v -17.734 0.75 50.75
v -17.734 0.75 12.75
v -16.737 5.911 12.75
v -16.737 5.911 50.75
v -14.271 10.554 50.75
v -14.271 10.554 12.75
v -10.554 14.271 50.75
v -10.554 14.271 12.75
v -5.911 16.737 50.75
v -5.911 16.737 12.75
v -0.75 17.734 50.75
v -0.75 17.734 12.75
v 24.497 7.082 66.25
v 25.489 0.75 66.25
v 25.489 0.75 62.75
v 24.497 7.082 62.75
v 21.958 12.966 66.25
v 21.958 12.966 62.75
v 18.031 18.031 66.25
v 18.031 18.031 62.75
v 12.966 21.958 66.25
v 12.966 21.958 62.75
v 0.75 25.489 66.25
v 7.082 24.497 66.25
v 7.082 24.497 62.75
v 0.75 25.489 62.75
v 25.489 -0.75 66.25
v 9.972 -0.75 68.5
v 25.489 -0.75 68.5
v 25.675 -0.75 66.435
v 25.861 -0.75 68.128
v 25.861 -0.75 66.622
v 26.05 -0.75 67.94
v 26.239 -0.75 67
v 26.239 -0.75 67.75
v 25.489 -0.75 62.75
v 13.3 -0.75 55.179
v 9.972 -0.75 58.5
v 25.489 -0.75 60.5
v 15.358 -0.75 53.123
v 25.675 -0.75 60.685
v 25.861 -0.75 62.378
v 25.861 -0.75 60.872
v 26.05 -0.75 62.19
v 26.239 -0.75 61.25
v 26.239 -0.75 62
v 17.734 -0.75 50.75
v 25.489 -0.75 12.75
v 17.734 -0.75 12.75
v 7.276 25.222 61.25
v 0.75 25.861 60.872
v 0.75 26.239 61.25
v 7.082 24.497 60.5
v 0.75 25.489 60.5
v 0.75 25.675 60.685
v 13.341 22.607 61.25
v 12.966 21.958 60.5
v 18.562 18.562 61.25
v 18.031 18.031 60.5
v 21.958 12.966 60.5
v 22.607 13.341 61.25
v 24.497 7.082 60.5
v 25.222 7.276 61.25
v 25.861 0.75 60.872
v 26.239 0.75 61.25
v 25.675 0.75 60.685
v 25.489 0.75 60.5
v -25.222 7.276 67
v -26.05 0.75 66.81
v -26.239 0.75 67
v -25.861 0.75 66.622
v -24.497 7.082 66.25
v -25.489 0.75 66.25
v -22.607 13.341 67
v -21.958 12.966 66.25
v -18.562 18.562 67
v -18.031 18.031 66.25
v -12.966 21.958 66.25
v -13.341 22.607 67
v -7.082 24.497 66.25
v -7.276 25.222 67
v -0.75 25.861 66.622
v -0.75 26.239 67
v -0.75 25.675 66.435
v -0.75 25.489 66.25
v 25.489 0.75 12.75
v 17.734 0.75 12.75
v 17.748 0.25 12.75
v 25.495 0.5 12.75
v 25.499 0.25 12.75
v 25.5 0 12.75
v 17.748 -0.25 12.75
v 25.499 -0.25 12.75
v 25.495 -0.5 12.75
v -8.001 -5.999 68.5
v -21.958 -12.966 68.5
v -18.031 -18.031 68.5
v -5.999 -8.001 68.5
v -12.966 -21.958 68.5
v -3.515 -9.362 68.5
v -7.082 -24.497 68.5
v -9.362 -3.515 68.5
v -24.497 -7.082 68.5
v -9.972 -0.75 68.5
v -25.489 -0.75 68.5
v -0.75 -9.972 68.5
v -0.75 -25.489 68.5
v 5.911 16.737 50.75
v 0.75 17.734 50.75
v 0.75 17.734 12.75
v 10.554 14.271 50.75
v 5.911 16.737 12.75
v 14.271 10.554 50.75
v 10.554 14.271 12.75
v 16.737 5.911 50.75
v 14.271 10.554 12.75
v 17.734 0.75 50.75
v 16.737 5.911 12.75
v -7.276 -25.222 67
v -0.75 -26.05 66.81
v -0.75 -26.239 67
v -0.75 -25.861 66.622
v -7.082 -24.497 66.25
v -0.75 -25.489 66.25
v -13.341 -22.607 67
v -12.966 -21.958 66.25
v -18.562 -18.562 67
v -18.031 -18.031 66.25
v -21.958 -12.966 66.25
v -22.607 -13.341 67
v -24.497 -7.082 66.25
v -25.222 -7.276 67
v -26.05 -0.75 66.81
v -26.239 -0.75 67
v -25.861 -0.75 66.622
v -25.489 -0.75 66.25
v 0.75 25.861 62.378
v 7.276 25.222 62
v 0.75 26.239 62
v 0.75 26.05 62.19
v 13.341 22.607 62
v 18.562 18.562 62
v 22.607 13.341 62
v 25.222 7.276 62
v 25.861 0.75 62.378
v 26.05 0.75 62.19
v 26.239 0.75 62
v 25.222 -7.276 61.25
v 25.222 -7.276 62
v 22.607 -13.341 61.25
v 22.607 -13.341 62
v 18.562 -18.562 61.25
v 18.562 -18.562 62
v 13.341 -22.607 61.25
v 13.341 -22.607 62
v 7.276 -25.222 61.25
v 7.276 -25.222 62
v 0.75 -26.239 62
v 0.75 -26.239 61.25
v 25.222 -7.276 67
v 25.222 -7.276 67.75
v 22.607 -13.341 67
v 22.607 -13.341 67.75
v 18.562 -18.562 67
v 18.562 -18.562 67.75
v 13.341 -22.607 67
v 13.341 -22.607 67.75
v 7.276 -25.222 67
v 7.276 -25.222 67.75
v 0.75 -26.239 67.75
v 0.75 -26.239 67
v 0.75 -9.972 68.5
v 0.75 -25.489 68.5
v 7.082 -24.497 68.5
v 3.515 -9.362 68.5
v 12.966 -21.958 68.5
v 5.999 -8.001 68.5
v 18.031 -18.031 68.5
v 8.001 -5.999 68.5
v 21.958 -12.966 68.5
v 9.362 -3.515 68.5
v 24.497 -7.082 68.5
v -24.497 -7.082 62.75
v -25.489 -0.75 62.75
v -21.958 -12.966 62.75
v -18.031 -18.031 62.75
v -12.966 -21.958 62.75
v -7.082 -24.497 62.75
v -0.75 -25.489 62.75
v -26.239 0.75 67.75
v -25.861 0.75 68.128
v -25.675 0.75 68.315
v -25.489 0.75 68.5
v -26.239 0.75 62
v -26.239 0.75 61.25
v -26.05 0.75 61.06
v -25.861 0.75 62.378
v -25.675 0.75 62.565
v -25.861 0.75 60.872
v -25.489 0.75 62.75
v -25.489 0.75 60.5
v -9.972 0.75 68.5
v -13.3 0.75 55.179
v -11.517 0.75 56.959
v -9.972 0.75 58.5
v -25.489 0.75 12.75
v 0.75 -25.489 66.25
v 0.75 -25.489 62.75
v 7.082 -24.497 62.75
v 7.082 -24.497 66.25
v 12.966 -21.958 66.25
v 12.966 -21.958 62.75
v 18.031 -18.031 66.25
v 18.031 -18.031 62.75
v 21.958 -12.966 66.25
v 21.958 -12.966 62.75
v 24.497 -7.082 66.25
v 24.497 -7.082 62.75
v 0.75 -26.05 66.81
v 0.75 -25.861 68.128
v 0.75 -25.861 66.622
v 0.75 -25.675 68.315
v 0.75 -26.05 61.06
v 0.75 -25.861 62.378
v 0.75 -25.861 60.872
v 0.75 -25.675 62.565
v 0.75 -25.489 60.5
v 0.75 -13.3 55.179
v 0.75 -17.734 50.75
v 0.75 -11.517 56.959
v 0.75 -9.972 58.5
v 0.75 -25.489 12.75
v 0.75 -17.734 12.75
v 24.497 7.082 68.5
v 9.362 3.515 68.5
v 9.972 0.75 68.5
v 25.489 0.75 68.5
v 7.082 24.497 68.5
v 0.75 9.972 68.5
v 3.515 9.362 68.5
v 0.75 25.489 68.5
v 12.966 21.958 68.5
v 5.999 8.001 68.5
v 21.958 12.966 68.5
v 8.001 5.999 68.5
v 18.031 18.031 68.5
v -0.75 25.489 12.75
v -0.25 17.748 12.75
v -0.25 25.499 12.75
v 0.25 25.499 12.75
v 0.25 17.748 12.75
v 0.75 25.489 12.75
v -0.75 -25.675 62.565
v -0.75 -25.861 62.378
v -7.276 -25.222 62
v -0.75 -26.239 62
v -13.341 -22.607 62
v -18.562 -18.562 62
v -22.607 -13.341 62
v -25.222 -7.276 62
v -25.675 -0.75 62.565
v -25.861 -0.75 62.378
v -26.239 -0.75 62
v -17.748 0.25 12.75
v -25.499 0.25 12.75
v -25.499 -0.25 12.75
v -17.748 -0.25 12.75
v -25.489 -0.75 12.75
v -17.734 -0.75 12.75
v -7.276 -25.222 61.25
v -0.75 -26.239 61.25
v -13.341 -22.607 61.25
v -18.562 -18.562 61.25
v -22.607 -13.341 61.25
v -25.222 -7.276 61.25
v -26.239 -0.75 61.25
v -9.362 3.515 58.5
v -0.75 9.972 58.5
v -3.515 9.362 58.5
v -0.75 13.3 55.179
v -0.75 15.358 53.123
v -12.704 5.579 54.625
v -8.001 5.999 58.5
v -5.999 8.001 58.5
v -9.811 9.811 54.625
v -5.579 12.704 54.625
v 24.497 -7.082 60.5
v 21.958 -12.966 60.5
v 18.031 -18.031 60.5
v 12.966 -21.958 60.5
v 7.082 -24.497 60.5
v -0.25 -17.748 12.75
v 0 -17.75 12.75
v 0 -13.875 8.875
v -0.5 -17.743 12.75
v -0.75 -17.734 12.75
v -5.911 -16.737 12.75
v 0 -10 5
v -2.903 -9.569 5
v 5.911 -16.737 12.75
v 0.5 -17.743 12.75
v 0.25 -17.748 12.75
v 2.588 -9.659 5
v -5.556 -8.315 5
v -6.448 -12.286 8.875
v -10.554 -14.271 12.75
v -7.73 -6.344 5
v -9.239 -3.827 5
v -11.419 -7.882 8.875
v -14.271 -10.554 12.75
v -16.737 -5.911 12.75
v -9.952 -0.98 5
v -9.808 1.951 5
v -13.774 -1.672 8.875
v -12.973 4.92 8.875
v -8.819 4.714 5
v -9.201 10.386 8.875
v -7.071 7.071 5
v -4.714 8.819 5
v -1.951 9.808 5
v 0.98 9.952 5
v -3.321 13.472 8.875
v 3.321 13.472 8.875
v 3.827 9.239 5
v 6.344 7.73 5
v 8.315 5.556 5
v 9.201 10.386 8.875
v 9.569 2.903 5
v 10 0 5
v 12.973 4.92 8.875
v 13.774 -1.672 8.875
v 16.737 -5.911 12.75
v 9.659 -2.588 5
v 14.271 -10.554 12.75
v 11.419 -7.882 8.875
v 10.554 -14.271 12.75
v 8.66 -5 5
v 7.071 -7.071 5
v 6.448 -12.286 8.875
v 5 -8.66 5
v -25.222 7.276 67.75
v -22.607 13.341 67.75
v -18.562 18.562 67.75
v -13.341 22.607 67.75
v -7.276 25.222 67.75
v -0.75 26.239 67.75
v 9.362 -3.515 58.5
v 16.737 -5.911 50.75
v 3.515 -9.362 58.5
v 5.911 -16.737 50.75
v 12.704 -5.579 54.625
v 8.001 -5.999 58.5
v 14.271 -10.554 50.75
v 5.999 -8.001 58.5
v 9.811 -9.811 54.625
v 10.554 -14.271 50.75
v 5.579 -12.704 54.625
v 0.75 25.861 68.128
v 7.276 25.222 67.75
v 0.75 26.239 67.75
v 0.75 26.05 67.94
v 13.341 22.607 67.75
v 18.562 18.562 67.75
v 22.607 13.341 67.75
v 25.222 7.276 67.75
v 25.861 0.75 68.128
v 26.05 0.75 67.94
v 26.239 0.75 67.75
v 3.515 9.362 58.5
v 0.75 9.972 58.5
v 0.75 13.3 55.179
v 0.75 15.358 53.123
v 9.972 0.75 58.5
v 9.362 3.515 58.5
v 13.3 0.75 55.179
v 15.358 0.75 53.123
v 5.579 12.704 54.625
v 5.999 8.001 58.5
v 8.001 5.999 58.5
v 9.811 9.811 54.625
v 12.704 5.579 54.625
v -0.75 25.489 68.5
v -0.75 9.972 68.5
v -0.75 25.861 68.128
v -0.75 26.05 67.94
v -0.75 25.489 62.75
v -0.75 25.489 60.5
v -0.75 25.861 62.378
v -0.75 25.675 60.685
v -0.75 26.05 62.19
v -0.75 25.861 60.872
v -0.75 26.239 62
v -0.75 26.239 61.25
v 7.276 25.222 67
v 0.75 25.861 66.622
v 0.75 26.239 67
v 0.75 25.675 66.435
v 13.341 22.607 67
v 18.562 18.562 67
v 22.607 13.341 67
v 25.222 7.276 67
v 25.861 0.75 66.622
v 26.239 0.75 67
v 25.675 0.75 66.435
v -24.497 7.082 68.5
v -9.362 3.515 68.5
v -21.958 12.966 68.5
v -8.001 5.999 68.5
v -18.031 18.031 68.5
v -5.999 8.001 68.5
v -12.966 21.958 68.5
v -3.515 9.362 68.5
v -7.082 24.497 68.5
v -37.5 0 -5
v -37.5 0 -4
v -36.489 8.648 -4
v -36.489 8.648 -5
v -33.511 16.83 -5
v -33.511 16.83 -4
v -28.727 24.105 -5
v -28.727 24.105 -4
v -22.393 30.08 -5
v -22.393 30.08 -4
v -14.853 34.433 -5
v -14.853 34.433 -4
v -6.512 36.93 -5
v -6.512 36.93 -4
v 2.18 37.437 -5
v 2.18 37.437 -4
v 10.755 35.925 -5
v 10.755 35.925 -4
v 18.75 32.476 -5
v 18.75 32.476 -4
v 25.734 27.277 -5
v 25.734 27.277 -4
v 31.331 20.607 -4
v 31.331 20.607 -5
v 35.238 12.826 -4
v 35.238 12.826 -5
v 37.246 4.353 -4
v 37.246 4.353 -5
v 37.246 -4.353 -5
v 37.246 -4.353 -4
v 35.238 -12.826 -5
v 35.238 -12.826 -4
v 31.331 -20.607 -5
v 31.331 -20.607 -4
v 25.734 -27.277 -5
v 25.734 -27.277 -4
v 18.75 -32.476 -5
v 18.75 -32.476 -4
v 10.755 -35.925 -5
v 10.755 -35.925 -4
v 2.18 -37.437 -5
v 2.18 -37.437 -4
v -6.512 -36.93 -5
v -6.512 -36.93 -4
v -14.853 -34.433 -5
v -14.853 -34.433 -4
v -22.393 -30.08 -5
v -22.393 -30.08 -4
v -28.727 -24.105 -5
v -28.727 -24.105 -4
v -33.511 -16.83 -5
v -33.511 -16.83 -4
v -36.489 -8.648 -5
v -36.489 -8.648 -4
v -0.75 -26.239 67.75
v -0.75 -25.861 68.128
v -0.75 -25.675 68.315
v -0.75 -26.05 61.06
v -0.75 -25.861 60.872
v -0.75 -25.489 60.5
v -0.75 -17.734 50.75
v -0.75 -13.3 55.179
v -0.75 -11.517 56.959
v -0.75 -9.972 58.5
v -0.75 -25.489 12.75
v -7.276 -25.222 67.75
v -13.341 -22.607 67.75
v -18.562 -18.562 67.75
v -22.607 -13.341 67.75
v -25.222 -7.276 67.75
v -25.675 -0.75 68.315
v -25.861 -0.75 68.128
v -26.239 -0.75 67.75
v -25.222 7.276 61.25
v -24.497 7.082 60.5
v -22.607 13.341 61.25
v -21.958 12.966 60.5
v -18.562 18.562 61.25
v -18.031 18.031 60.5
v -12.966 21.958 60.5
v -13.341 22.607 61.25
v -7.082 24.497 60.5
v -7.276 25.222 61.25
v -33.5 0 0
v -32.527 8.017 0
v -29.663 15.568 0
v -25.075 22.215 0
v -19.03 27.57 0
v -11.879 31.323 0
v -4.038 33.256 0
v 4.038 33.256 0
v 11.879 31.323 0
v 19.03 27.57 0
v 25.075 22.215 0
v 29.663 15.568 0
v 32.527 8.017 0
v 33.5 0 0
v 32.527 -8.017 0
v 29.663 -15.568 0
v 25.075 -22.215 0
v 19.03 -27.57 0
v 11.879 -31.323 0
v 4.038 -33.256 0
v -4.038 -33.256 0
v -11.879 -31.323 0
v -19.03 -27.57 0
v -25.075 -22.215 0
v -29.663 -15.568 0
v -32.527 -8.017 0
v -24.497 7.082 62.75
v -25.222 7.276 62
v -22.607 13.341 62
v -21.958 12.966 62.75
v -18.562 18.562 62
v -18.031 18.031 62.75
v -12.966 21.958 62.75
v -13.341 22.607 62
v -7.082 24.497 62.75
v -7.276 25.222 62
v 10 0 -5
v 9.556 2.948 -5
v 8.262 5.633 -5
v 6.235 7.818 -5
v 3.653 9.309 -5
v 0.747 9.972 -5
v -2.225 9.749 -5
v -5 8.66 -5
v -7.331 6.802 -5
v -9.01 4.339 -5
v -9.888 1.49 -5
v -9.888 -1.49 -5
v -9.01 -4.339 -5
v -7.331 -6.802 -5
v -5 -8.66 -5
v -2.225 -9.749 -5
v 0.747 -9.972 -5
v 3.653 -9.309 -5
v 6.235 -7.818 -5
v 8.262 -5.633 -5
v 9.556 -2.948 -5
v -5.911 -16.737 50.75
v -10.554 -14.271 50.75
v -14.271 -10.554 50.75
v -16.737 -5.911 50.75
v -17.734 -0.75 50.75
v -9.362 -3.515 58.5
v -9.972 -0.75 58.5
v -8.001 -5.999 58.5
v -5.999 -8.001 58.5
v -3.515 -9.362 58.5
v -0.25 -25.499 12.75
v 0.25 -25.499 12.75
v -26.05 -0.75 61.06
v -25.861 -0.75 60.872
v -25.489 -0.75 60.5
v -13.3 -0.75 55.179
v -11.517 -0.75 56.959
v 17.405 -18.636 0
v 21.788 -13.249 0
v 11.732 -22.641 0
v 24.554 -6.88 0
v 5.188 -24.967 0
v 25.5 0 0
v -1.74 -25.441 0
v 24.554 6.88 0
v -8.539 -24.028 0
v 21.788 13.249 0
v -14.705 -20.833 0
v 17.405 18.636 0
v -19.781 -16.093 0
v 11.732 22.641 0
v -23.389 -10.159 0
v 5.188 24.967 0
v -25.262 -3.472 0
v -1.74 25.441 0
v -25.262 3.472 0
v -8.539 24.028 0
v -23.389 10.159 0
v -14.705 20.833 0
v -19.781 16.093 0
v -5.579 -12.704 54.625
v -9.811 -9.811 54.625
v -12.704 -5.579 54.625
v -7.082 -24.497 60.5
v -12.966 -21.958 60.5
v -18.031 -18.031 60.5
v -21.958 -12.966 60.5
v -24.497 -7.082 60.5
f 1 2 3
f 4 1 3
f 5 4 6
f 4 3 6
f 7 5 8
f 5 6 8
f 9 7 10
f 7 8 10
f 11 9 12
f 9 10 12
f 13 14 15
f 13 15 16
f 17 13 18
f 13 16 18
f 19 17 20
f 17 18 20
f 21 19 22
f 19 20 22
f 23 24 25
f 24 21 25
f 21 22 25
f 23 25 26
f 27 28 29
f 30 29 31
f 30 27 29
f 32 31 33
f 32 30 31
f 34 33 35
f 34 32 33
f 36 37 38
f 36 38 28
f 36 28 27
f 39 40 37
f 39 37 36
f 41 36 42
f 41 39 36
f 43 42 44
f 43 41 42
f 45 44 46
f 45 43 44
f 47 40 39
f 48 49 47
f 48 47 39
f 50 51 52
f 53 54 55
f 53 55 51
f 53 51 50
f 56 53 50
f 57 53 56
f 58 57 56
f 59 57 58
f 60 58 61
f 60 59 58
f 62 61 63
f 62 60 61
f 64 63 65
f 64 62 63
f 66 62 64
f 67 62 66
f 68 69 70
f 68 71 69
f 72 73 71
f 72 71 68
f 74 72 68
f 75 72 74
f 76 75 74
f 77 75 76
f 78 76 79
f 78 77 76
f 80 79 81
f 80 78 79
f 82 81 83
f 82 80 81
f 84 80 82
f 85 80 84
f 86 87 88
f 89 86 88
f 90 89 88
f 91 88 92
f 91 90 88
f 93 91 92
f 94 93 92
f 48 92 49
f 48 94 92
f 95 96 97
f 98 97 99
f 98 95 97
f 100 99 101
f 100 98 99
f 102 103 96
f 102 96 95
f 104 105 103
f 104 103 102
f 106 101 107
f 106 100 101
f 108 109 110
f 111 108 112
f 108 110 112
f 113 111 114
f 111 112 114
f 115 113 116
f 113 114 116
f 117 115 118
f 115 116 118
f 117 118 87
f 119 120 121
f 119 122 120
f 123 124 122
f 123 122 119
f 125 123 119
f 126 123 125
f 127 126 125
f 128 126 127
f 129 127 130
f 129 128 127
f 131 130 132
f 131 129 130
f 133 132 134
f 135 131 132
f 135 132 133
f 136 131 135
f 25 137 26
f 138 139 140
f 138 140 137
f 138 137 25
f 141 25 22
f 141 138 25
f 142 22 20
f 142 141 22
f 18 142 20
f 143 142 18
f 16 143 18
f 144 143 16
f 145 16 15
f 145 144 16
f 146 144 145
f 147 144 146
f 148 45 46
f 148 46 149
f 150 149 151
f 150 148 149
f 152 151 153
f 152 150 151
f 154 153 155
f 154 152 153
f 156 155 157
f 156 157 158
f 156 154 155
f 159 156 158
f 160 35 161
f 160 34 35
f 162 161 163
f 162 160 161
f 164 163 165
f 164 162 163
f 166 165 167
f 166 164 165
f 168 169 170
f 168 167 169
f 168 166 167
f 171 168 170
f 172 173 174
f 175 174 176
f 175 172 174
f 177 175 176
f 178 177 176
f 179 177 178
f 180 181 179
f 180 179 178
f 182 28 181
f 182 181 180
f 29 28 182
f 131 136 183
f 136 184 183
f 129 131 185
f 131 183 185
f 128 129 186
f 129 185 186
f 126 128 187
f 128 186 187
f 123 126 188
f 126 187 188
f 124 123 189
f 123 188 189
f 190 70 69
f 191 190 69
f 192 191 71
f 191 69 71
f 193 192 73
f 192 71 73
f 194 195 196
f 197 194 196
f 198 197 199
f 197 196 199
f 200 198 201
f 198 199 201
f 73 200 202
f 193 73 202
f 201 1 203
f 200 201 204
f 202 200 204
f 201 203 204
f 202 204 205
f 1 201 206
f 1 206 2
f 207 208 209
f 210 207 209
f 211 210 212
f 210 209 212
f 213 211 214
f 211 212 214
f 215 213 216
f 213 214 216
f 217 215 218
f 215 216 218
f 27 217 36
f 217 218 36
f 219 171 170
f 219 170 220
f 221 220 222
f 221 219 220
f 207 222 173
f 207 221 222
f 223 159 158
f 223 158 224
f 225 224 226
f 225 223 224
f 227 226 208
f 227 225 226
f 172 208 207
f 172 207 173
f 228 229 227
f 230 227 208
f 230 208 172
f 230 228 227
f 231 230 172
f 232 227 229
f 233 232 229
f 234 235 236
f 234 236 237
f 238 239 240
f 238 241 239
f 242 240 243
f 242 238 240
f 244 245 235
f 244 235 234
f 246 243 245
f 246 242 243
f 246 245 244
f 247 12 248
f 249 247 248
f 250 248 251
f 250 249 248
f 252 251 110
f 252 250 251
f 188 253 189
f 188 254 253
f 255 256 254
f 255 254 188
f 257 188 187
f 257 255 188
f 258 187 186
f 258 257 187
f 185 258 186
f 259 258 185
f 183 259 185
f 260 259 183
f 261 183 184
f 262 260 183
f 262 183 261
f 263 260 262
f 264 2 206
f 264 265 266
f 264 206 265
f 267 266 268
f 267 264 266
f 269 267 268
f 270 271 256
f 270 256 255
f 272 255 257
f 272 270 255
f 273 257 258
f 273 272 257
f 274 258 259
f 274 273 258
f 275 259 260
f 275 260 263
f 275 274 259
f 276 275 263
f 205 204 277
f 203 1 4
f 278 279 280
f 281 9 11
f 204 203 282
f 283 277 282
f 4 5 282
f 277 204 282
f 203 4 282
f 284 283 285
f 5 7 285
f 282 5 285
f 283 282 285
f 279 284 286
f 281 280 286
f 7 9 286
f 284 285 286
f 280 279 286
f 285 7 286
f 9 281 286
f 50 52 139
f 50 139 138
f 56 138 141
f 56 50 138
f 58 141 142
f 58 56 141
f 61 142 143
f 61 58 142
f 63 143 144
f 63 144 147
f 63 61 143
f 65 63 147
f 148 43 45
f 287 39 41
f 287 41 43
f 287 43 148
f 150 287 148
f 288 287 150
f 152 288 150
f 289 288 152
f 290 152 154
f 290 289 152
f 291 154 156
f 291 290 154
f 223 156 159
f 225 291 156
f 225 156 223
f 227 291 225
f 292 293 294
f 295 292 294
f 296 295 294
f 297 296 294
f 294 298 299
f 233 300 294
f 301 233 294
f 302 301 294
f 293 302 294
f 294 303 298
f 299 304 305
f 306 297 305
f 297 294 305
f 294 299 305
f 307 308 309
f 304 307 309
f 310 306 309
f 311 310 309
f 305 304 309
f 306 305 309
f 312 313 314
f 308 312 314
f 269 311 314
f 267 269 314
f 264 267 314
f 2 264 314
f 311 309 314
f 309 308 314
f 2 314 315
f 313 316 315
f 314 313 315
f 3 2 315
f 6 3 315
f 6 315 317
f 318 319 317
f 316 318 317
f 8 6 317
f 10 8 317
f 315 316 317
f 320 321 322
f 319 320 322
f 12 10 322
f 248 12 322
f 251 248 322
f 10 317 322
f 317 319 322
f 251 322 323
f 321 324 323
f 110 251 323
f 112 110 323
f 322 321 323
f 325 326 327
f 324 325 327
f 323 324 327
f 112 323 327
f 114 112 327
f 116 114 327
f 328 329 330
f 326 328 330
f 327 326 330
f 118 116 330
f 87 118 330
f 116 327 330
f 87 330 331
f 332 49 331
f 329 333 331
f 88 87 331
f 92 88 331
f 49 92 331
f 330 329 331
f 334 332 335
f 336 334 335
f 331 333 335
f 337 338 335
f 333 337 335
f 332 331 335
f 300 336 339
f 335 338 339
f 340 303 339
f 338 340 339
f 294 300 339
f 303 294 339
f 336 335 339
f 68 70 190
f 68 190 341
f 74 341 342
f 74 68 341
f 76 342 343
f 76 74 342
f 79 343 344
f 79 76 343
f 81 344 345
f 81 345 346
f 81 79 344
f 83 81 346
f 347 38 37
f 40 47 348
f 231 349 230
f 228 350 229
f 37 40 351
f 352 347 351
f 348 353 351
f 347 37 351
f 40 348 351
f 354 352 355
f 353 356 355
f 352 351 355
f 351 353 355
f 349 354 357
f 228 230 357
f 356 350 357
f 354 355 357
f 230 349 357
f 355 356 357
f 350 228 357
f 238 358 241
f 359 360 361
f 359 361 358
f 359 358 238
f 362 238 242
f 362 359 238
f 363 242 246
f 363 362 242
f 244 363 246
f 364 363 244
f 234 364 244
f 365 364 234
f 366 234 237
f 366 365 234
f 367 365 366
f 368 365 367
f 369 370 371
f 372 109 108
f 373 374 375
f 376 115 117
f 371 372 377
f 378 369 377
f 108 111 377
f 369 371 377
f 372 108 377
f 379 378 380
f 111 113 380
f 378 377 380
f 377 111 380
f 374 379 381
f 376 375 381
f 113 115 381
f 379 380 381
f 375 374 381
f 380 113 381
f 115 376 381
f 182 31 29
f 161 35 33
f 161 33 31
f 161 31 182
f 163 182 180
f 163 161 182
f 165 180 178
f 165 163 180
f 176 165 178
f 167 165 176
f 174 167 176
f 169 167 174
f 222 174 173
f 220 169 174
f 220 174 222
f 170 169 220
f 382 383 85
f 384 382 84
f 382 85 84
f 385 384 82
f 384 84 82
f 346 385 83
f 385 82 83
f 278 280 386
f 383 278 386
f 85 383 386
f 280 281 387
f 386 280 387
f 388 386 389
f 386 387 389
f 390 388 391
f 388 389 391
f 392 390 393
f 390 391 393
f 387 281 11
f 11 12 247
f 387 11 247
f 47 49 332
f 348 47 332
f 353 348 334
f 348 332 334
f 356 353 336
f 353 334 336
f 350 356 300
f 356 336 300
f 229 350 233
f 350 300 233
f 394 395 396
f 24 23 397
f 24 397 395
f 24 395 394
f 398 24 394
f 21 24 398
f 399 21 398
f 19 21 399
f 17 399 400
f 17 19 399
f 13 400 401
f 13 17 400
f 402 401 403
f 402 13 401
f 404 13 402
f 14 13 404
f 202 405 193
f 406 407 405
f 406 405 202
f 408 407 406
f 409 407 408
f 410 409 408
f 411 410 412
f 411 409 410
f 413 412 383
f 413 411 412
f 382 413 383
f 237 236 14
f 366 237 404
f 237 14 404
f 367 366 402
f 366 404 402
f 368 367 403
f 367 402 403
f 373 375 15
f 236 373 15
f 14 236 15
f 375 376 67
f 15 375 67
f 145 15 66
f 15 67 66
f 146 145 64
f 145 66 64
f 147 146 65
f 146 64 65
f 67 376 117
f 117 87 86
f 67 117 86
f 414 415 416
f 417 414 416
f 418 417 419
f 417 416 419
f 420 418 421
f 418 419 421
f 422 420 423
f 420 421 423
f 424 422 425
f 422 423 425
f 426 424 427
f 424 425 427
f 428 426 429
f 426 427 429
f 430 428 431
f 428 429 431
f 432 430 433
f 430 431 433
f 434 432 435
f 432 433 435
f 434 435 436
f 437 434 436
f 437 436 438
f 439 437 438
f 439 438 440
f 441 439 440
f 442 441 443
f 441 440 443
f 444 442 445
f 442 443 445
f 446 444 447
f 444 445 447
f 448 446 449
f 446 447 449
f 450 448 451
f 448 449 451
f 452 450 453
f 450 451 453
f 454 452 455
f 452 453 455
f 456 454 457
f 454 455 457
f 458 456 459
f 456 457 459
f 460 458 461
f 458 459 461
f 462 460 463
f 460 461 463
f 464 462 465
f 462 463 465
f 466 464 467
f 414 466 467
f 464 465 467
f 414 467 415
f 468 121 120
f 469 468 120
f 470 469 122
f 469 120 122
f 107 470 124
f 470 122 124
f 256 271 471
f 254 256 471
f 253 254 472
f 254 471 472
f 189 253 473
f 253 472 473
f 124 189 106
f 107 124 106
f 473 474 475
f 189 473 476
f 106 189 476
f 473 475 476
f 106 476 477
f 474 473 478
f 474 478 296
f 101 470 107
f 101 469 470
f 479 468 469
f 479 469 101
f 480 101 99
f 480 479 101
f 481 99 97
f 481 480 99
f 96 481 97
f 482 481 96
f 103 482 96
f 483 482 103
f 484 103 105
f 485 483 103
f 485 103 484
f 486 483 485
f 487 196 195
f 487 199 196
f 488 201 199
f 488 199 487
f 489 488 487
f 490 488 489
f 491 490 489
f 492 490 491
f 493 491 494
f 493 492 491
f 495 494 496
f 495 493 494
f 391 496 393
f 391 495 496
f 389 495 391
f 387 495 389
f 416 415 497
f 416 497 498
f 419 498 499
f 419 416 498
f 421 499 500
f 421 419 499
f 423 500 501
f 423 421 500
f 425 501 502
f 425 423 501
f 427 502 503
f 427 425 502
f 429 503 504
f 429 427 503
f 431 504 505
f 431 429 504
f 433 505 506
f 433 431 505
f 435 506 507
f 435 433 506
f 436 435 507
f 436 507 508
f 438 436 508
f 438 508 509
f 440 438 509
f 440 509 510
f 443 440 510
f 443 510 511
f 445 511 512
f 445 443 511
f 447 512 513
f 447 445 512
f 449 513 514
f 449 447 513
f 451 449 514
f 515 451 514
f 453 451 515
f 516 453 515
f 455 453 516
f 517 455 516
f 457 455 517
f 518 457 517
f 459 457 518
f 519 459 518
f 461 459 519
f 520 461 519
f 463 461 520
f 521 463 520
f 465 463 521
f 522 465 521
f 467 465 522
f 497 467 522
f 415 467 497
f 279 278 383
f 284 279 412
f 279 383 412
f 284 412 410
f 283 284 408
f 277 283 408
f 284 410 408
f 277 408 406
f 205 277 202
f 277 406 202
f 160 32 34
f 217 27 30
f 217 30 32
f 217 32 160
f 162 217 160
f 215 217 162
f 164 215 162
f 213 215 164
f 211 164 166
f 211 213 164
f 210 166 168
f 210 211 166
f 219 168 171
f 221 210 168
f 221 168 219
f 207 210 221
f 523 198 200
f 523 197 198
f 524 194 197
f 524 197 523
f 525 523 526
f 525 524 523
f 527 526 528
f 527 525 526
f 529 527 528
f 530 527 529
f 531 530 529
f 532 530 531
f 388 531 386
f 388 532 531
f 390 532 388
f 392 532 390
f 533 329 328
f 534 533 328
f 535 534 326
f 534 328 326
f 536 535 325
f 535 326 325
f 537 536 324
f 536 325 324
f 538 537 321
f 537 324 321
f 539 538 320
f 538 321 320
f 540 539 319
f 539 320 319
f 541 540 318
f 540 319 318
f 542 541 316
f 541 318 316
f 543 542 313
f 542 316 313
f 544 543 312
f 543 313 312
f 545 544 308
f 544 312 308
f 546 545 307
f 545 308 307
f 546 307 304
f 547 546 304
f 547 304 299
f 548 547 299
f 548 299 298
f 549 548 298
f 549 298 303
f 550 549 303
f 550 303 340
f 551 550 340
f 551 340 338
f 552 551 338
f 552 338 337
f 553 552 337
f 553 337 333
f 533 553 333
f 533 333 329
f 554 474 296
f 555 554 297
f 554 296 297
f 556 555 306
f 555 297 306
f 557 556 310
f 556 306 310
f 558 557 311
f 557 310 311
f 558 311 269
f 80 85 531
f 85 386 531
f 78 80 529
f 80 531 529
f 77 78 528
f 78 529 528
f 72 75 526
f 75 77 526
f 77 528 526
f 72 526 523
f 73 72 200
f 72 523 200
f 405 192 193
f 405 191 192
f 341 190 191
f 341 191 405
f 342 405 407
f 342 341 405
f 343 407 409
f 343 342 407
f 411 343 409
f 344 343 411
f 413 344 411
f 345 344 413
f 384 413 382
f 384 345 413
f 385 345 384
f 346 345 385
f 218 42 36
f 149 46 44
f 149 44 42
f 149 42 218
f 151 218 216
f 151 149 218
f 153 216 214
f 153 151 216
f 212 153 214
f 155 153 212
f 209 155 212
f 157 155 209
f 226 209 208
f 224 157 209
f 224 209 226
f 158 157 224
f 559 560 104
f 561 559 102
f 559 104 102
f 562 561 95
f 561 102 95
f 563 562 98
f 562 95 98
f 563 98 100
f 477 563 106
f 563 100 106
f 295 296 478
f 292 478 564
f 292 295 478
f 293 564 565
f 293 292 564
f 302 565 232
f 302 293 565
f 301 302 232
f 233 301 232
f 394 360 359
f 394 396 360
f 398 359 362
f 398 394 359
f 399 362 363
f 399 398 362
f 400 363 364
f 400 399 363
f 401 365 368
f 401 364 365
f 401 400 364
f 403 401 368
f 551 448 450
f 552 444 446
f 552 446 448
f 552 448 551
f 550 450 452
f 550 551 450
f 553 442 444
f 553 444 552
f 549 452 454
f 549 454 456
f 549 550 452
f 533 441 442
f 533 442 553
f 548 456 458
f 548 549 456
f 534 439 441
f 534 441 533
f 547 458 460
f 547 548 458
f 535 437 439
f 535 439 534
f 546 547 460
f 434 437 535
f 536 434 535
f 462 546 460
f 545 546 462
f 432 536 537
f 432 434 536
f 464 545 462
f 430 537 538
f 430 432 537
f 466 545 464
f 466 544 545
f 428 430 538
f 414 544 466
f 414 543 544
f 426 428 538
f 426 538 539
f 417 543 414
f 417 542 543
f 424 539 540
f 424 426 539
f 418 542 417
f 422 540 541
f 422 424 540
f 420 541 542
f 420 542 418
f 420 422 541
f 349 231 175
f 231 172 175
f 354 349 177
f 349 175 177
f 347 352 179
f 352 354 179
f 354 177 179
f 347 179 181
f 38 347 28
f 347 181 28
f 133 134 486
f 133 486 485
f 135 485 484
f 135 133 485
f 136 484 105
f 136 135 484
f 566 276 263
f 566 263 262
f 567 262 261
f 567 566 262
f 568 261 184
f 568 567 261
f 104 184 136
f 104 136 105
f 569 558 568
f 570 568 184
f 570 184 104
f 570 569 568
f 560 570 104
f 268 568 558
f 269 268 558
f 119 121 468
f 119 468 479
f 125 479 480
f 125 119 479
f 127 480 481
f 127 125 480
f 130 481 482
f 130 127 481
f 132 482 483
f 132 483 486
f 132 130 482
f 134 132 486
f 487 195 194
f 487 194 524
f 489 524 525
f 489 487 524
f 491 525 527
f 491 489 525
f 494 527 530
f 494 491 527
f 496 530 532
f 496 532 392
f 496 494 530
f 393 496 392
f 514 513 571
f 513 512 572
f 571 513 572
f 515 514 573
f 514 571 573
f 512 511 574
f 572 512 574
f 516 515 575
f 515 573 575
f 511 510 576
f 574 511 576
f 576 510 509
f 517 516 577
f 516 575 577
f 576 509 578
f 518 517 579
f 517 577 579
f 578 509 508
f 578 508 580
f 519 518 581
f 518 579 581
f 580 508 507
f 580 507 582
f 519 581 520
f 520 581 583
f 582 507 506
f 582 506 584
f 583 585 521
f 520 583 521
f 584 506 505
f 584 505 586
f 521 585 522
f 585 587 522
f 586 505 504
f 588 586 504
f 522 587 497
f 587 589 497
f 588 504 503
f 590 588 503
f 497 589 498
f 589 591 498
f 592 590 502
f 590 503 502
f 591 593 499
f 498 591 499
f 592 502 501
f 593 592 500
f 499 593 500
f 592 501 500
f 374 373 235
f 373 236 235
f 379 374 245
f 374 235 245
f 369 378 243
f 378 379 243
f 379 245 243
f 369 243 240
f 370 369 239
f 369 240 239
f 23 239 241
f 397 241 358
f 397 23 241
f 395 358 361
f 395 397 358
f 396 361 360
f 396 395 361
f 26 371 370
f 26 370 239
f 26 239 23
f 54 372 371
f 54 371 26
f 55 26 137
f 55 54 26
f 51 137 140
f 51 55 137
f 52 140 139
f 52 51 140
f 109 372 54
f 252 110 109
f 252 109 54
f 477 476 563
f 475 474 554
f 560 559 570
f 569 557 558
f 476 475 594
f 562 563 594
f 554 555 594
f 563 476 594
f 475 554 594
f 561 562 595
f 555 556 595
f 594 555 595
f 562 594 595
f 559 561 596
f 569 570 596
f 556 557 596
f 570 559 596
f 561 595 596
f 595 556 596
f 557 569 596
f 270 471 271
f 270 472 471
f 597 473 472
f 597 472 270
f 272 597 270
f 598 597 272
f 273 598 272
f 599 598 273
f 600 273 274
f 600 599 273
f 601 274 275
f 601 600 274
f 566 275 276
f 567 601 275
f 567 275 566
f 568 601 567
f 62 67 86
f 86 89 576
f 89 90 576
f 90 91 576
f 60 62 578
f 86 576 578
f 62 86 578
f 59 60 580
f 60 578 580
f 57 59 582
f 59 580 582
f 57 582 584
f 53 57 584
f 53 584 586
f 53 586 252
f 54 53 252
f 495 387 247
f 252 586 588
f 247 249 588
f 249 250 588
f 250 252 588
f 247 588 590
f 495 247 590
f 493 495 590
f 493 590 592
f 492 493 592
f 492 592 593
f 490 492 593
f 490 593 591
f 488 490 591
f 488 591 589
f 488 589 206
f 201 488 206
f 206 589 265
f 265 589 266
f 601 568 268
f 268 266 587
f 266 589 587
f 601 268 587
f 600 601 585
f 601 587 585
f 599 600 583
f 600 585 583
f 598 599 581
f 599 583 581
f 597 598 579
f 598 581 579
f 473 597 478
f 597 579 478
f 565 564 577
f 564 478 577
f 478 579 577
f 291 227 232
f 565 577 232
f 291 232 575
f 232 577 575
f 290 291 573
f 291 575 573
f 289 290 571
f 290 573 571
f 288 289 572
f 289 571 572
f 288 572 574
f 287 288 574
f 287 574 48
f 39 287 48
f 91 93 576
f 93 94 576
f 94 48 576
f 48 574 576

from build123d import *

# Parameters (mm, degrees)
AXLE_BASE_SKETCH_R        = 25.5
AXLE_DEPTH                = 68.5
GUARD_BASE_R              = 37.5
GUARD_DEPTH               = 5
INNER_AXLE_HOLE_BASE_R    = 10
INNER_AXLE_HOLE_DEPTH     = 74.5
BEND_START                = -55.75
BEND_ROOM_BASE_W          = 1.5
BEND_ROOM_BASE_H          = 75
BEND_ROOM_1_DEPTH         = 55.750001
BEND_ROOM_2_COUNT         = 2
BEND_ROOM_2_ANGLE         = 90
EASY_REMOVAL_CHAMFER_SIZE = 4


with BuildPart() as part:
    # Axle base sketch → Axle (new body)
    with BuildSketch(Plane.XY):
        Circle(AXLE_BASE_SKETCH_R)
    extrude(amount=AXLE_DEPTH)

    # Guard base → Guard (add)
    with BuildSketch(Plane(origin=(0, 0, 0), x_dir=(-1, 0, 0), z_dir=(0, 0, -1))):
        Circle(GUARD_BASE_R)
    extrude(amount=GUARD_DEPTH)

    # Inner axle hole base → Inner axle hole (cut, through all)
    with BuildSketch(Plane.XY.offset(68.5)):
        Circle(INNER_AXLE_HOLE_BASE_R)
    extrude(amount=-INNER_AXLE_HOLE_DEPTH, mode=Mode.SUBTRACT)

    # Mate ring base → Mate rings (revolve)
    with BuildSketch(Plane(origin=(0, 0, 0), x_dir=(1, 0, 0), z_dir=(0, 1, 0))):
        Polygon((25.5, -68.5), (26.25, -67.75), (26.25, -67), (25.5, -66.25), align=None)
        Polygon((25.5, -62.75), (26.25, -62), (26.25, -61.25), (25.5, -60.5), align=None)
    revolve(axis=Axis((0, 0, 0), (0, 0, -1)))

    # Inner mass remove base → Inner mass remove (revolve, cut)
    with BuildSketch(Plane(origin=(0, 0, 0), x_dir=(0, 0, -1), z_dir=(1, 0, 0))):
        Polygon((-68.5, 0), (-50.75, -17.75), (-12.75, -17.75), (5, 0), align=None)
    revolve(axis=Axis((0, 0, 0), (0, 0, -1)), mode=Mode.SUBTRACT)

    # Bend room base → Bend room 1 (cut)
    with BuildSketch(Plane.XY.offset(68.5).offset(BEND_START)):
        Rectangle(BEND_ROOM_BASE_W, BEND_ROOM_BASE_H)
    bend_room_1 = extrude(amount=BEND_ROOM_1_DEPTH, mode=Mode.SUBTRACT)

    # Bend room 2: Bend room 1 ×2 about axis
    bend_room_2_axis = Axis((0, 0, 0), (0, 0, -1))
    for i in range(1, BEND_ROOM_2_COUNT):
        add(bend_room_1.rotate(bend_room_2_axis, i * BEND_ROOM_2_ANGLE / (BEND_ROOM_2_COUNT - 1)), mode=Mode.SUBTRACT)

    # Easy removal chamfer
    easy_removal_chamfer_edges = [part.edges().sort_by_distance(p)[0] for p in [
        (37.5, 0, 0),
    ]]
    chamfer(easy_removal_chamfer_edges, length=EASY_REMOVAL_CHAMFER_SIZE)


solid = part.part
